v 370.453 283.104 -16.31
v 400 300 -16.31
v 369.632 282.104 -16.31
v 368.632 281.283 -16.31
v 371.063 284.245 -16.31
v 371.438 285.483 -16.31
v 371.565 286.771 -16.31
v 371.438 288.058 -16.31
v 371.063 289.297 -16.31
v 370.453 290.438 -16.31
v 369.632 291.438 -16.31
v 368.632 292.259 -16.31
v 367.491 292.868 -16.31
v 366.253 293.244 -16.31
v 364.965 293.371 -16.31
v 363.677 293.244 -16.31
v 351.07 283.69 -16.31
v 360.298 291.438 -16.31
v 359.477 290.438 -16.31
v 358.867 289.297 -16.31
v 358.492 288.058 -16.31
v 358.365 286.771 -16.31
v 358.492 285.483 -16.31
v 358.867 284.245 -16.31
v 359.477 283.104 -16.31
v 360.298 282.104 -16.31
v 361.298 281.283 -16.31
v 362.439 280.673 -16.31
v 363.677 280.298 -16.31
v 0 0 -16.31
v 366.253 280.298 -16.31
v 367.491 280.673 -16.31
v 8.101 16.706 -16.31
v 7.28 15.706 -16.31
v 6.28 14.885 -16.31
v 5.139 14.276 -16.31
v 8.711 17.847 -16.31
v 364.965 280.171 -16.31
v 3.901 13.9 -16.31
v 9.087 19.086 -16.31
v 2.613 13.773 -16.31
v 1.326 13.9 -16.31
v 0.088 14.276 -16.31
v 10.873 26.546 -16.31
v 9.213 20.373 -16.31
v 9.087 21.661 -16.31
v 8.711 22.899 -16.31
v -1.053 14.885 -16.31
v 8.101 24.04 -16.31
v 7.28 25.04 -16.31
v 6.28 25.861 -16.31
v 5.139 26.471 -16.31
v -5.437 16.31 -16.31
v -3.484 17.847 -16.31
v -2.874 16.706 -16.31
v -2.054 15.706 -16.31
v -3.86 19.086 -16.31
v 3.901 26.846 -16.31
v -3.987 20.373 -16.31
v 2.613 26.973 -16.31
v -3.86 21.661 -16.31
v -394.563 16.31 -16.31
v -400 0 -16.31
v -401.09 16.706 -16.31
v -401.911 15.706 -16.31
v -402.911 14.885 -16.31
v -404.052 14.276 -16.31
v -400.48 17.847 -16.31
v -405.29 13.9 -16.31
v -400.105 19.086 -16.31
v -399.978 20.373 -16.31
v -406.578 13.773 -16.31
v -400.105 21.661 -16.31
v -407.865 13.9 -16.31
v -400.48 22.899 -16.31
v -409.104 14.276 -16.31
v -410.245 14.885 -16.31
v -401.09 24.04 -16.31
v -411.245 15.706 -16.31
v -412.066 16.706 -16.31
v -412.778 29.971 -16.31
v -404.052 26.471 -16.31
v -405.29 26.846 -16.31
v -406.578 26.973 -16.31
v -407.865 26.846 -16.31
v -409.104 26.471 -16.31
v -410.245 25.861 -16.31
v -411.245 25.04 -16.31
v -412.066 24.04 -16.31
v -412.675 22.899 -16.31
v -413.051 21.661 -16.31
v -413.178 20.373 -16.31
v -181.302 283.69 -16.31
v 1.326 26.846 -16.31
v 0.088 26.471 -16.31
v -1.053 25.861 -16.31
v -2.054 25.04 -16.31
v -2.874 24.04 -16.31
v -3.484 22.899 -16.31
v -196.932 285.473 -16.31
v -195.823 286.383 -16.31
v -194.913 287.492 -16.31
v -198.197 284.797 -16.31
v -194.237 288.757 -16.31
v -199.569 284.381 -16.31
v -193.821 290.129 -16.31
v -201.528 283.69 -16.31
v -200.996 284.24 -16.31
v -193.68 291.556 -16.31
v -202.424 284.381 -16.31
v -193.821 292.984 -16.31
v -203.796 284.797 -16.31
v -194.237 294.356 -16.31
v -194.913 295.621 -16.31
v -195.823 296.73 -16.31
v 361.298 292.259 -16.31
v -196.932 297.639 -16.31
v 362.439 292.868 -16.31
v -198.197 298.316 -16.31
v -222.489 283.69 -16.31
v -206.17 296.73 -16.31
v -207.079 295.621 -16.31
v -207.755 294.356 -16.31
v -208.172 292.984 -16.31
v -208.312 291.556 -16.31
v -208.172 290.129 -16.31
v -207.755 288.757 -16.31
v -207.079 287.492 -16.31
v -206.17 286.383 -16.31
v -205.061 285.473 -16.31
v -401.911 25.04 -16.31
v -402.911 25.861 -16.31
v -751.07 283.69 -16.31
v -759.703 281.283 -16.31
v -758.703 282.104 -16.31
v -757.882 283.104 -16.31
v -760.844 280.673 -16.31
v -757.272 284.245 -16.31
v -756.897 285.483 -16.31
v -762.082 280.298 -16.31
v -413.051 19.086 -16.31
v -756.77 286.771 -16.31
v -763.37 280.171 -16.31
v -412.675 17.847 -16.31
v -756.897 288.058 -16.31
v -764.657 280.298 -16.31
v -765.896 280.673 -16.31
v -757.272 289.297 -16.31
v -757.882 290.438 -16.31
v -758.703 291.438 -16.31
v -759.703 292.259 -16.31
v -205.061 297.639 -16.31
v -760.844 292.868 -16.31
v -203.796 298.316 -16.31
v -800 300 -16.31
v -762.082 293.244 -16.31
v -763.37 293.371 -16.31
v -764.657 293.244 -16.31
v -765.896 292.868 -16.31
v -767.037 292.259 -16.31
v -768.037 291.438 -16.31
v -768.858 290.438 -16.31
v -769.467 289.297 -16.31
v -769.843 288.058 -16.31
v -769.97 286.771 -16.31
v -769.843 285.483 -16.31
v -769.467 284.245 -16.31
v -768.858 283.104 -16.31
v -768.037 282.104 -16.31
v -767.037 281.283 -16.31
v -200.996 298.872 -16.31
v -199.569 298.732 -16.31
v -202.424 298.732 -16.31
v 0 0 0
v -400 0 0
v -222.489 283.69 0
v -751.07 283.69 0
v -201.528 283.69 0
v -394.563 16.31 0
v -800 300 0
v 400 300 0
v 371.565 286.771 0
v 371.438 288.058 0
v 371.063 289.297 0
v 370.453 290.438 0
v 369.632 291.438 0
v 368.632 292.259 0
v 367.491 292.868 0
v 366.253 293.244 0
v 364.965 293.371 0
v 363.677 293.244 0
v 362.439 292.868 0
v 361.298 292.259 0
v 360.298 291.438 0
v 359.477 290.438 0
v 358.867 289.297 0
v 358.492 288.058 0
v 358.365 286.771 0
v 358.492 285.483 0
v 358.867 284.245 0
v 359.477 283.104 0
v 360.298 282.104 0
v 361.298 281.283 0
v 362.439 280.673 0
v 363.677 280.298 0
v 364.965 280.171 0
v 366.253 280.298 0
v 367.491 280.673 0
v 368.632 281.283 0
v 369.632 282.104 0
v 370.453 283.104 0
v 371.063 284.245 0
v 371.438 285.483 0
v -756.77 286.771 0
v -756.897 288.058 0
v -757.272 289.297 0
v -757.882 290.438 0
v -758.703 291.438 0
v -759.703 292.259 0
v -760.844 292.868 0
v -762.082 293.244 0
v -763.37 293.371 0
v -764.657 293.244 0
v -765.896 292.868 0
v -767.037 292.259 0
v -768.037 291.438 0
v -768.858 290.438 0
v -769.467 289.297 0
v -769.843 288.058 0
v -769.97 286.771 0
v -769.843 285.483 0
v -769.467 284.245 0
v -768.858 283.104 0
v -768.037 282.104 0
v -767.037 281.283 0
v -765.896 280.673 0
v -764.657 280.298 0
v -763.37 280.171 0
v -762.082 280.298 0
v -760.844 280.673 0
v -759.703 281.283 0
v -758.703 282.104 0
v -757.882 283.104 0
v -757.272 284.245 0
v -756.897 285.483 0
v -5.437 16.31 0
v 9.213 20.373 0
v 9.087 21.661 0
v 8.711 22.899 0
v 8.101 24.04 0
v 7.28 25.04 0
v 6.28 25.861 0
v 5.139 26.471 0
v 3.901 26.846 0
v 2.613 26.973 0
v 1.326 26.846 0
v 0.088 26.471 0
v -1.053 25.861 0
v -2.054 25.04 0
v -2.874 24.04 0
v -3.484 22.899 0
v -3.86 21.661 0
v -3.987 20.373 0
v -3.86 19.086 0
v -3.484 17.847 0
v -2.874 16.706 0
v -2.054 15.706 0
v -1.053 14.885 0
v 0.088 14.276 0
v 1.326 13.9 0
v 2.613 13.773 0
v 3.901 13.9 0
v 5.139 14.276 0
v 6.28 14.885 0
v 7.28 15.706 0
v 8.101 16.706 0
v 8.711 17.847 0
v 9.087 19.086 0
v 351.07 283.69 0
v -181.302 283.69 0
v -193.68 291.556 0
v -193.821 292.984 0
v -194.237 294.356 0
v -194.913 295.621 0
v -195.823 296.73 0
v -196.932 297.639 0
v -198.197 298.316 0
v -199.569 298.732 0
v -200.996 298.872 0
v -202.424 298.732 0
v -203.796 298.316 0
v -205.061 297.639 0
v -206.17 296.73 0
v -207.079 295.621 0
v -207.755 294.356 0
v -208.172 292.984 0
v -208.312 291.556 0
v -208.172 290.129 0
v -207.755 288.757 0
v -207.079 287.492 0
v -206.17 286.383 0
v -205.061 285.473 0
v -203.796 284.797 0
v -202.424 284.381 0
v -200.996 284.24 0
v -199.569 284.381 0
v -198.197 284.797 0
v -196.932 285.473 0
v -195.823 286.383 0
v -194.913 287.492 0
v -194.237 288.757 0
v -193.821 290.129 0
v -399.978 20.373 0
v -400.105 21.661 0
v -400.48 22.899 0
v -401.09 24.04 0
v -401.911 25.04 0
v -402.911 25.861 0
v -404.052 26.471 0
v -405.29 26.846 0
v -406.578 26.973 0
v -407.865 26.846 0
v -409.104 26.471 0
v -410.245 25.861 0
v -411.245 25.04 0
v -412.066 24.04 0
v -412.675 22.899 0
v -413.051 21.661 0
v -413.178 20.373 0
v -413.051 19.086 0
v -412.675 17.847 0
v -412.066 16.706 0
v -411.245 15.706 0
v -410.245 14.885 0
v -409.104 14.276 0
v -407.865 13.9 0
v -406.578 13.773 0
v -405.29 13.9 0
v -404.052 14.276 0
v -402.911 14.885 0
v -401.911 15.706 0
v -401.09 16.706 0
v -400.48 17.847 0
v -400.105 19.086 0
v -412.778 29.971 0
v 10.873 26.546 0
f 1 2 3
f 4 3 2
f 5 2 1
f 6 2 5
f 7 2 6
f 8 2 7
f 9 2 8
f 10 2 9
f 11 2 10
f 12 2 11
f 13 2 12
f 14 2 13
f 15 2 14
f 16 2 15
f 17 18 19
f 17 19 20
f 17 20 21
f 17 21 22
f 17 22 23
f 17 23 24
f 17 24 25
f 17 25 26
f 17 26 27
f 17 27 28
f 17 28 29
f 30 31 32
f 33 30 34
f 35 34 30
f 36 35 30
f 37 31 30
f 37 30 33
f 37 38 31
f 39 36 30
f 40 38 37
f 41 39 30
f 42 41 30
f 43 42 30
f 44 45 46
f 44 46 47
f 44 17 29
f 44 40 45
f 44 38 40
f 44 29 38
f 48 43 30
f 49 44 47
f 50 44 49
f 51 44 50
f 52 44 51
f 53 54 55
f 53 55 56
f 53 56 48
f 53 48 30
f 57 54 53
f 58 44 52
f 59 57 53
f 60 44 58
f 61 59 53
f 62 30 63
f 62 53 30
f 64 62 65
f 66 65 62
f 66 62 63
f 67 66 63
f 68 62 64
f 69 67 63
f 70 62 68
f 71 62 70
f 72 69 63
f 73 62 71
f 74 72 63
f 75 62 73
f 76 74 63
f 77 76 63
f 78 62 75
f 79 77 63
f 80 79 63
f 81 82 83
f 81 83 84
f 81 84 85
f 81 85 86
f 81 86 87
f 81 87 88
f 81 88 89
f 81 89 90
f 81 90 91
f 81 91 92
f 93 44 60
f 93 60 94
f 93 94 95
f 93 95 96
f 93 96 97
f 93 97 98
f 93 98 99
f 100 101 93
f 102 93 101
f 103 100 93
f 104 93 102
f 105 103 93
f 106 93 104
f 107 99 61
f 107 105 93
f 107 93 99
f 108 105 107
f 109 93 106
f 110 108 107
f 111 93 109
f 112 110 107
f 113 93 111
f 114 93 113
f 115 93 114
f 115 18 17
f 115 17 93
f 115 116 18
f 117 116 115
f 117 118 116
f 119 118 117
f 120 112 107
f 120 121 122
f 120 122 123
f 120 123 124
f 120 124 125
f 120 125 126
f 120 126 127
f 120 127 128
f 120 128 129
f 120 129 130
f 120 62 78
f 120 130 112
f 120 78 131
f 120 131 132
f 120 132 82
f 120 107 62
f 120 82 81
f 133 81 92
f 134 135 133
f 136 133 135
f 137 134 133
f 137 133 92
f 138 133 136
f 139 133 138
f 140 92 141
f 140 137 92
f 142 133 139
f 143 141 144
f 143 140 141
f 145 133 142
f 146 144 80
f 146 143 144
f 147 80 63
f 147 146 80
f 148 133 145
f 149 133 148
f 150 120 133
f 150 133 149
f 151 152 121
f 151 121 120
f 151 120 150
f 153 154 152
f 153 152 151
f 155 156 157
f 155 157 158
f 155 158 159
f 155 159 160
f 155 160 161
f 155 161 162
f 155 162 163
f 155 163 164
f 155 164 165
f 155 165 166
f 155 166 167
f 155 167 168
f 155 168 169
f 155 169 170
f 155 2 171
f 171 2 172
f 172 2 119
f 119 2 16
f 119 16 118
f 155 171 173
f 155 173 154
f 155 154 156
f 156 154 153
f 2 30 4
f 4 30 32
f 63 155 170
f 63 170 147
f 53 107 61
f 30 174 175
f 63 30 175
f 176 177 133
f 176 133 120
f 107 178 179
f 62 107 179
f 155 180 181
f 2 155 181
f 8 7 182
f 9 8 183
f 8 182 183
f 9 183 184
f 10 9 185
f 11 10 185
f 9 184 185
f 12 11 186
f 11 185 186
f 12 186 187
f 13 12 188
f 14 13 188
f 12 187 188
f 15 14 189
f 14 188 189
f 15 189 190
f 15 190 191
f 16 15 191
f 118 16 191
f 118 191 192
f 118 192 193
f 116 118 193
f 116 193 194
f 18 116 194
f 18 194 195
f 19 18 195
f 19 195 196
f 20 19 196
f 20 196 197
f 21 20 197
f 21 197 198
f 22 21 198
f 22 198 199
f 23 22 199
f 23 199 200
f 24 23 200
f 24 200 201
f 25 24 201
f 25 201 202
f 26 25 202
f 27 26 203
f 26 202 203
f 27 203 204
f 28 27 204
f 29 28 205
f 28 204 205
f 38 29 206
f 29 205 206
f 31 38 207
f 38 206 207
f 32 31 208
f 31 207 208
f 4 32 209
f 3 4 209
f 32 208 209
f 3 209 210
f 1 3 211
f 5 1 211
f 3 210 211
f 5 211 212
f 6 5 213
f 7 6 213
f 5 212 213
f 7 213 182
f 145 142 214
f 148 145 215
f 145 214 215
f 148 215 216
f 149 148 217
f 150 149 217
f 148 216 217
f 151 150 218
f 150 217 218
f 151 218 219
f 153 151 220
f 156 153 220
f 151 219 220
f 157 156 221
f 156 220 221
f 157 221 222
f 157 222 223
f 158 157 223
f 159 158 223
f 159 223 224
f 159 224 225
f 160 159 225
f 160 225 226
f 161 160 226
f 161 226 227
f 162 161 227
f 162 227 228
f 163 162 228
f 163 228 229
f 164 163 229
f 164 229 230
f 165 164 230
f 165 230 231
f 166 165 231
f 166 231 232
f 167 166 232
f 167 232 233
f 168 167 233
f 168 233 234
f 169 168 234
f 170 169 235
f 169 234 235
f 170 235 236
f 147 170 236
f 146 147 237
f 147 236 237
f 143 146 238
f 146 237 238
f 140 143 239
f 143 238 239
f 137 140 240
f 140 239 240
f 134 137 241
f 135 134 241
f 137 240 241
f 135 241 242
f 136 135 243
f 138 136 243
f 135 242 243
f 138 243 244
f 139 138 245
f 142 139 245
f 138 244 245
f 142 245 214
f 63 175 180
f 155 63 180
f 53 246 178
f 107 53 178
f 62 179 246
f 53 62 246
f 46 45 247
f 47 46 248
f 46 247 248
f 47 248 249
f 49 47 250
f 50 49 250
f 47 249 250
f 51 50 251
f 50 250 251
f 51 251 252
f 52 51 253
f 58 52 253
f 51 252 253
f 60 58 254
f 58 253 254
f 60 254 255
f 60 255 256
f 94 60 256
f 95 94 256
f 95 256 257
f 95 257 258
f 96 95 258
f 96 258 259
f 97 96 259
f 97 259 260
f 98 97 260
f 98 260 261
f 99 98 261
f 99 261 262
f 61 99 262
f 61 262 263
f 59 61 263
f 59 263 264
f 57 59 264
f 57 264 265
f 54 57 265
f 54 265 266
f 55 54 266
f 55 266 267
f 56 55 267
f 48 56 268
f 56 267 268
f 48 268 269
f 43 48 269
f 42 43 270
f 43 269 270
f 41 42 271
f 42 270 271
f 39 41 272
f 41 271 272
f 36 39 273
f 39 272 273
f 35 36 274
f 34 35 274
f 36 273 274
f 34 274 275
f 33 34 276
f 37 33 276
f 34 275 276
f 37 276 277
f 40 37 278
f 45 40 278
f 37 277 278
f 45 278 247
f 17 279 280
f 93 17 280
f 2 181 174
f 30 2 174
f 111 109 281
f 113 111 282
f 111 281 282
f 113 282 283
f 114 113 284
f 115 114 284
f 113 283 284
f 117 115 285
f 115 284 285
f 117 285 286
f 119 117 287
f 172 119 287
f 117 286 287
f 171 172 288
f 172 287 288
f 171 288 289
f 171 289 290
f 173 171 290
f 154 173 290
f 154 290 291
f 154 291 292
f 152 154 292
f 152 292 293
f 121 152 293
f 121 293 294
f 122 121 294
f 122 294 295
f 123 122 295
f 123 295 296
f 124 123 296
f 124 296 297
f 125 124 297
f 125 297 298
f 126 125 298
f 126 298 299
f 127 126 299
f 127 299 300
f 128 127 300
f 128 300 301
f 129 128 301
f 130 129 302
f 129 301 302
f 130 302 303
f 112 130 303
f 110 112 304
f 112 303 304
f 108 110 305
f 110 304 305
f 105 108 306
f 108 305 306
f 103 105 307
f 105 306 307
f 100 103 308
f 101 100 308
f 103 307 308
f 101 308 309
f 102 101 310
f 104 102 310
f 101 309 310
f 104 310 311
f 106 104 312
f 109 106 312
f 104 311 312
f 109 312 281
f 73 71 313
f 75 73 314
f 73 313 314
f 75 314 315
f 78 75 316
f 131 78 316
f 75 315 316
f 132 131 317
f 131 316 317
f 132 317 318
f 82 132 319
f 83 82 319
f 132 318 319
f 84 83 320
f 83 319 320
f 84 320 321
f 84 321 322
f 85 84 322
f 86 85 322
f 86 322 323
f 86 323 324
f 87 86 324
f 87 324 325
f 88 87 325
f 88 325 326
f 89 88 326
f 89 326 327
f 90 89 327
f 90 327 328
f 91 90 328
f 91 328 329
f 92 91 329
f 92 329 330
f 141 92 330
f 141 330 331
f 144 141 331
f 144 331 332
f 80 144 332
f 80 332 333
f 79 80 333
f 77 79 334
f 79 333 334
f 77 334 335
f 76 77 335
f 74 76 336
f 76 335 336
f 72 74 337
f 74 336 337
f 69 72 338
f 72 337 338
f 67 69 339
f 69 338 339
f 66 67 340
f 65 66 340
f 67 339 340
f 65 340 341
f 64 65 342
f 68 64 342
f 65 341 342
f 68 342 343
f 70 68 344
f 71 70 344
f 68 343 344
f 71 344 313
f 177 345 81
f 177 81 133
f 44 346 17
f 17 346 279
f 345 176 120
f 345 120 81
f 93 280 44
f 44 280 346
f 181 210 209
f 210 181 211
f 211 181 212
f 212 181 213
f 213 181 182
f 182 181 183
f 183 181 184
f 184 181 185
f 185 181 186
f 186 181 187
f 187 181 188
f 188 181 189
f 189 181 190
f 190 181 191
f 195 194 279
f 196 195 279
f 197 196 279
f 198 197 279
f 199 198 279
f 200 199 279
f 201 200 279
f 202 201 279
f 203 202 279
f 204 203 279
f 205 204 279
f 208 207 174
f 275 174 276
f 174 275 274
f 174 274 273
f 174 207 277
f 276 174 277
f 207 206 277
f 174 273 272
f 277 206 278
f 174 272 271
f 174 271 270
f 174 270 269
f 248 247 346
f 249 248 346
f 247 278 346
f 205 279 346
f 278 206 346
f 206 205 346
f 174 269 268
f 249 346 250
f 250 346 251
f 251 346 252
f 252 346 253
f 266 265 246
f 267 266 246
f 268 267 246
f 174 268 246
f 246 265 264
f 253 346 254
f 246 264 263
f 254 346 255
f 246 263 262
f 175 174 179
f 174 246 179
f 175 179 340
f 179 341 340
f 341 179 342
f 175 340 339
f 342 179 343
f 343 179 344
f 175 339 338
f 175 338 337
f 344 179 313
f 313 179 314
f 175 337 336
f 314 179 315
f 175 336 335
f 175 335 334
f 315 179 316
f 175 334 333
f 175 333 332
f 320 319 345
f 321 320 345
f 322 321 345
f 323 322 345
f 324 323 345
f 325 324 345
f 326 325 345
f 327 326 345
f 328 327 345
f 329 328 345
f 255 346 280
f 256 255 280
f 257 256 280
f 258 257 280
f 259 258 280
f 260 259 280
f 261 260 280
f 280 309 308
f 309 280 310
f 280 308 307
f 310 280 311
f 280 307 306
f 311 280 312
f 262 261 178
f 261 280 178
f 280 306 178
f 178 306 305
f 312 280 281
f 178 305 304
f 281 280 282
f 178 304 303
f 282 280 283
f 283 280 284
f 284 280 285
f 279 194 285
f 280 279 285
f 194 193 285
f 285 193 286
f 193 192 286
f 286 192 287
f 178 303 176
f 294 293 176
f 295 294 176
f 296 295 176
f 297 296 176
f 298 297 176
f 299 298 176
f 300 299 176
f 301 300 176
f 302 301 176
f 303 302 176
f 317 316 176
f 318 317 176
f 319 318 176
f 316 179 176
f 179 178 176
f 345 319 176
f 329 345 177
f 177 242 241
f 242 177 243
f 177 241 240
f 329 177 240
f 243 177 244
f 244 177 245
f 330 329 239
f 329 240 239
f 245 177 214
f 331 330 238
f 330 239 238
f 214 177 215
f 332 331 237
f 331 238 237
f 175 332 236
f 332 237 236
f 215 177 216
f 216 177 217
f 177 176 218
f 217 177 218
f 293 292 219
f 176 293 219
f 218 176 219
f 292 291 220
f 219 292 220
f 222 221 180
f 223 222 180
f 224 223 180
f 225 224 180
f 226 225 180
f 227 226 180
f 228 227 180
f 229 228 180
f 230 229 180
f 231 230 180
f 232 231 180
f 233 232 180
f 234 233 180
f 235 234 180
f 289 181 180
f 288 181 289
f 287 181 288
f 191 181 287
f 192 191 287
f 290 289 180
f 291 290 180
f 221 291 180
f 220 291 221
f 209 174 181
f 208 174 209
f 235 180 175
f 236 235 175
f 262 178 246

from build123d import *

# Parameters (mm, degrees)
BOSS_EXTRUDE1_DEPTH = 16.31
CUT_EXTRUDE4_DEPTH  = 130.31
SKETCH3_R           = 7.316006069
SKETCH3_R_2         = 6.6
CUT_EXTRUDE6_DEPTH  = 130.31


with BuildPart() as part:
    # Sketch1 → Boss-Extrude1 (new body)
    with BuildSketch(Plane.XY):
        Polygon((-800, 300), (400, 300), (0, 0), (-400, 0), align=None)
        Polygon((-394.563333333, 16.31), (-5.436666667, 16.31), (-201.528049499, 283.69), align=None, mode=Mode.SUBTRACT)
    extrude(amount=-BOSS_EXTRUDE1_DEPTH)

    # Sketch2 → Cut-Extrude4 (cut)
    with BuildSketch(Plane.XY):
        Polygon((-181.30202164, 283.69), (10.873333333, 26.546261845), (351.07, 283.69), align=None)
        Polygon((-751.07, 283.69), (-222.488676184, 283.69), (-412.777952758, 29.970964568), align=None)
    extrude(amount=-CUT_EXTRUDE4_DEPTH, mode=Mode.SUBTRACT)

    # Sketch3 → Cut-Extrude6 (cut)
    with BuildSketch(Plane.XY):
        with Locations((-200.996317691, 291.556411045)):
            Circle(SKETCH3_R)
        with Locations((-763.369850402, 286.770824774)):
            Circle(SKETCH3_R_2)
        with Locations((364.965045825, 286.770824774)):
            Circle(SKETCH3_R_2)
        with Locations((2.613340708, 20.373189048)):
            Circle(SKETCH3_R_2)
        with Locations((-406.577807344, 20.373189048)):
            Circle(SKETCH3_R_2)
    extrude(amount=-CUT_EXTRUDE6_DEPTH, mode=Mode.SUBTRACT)


solid = part.part
